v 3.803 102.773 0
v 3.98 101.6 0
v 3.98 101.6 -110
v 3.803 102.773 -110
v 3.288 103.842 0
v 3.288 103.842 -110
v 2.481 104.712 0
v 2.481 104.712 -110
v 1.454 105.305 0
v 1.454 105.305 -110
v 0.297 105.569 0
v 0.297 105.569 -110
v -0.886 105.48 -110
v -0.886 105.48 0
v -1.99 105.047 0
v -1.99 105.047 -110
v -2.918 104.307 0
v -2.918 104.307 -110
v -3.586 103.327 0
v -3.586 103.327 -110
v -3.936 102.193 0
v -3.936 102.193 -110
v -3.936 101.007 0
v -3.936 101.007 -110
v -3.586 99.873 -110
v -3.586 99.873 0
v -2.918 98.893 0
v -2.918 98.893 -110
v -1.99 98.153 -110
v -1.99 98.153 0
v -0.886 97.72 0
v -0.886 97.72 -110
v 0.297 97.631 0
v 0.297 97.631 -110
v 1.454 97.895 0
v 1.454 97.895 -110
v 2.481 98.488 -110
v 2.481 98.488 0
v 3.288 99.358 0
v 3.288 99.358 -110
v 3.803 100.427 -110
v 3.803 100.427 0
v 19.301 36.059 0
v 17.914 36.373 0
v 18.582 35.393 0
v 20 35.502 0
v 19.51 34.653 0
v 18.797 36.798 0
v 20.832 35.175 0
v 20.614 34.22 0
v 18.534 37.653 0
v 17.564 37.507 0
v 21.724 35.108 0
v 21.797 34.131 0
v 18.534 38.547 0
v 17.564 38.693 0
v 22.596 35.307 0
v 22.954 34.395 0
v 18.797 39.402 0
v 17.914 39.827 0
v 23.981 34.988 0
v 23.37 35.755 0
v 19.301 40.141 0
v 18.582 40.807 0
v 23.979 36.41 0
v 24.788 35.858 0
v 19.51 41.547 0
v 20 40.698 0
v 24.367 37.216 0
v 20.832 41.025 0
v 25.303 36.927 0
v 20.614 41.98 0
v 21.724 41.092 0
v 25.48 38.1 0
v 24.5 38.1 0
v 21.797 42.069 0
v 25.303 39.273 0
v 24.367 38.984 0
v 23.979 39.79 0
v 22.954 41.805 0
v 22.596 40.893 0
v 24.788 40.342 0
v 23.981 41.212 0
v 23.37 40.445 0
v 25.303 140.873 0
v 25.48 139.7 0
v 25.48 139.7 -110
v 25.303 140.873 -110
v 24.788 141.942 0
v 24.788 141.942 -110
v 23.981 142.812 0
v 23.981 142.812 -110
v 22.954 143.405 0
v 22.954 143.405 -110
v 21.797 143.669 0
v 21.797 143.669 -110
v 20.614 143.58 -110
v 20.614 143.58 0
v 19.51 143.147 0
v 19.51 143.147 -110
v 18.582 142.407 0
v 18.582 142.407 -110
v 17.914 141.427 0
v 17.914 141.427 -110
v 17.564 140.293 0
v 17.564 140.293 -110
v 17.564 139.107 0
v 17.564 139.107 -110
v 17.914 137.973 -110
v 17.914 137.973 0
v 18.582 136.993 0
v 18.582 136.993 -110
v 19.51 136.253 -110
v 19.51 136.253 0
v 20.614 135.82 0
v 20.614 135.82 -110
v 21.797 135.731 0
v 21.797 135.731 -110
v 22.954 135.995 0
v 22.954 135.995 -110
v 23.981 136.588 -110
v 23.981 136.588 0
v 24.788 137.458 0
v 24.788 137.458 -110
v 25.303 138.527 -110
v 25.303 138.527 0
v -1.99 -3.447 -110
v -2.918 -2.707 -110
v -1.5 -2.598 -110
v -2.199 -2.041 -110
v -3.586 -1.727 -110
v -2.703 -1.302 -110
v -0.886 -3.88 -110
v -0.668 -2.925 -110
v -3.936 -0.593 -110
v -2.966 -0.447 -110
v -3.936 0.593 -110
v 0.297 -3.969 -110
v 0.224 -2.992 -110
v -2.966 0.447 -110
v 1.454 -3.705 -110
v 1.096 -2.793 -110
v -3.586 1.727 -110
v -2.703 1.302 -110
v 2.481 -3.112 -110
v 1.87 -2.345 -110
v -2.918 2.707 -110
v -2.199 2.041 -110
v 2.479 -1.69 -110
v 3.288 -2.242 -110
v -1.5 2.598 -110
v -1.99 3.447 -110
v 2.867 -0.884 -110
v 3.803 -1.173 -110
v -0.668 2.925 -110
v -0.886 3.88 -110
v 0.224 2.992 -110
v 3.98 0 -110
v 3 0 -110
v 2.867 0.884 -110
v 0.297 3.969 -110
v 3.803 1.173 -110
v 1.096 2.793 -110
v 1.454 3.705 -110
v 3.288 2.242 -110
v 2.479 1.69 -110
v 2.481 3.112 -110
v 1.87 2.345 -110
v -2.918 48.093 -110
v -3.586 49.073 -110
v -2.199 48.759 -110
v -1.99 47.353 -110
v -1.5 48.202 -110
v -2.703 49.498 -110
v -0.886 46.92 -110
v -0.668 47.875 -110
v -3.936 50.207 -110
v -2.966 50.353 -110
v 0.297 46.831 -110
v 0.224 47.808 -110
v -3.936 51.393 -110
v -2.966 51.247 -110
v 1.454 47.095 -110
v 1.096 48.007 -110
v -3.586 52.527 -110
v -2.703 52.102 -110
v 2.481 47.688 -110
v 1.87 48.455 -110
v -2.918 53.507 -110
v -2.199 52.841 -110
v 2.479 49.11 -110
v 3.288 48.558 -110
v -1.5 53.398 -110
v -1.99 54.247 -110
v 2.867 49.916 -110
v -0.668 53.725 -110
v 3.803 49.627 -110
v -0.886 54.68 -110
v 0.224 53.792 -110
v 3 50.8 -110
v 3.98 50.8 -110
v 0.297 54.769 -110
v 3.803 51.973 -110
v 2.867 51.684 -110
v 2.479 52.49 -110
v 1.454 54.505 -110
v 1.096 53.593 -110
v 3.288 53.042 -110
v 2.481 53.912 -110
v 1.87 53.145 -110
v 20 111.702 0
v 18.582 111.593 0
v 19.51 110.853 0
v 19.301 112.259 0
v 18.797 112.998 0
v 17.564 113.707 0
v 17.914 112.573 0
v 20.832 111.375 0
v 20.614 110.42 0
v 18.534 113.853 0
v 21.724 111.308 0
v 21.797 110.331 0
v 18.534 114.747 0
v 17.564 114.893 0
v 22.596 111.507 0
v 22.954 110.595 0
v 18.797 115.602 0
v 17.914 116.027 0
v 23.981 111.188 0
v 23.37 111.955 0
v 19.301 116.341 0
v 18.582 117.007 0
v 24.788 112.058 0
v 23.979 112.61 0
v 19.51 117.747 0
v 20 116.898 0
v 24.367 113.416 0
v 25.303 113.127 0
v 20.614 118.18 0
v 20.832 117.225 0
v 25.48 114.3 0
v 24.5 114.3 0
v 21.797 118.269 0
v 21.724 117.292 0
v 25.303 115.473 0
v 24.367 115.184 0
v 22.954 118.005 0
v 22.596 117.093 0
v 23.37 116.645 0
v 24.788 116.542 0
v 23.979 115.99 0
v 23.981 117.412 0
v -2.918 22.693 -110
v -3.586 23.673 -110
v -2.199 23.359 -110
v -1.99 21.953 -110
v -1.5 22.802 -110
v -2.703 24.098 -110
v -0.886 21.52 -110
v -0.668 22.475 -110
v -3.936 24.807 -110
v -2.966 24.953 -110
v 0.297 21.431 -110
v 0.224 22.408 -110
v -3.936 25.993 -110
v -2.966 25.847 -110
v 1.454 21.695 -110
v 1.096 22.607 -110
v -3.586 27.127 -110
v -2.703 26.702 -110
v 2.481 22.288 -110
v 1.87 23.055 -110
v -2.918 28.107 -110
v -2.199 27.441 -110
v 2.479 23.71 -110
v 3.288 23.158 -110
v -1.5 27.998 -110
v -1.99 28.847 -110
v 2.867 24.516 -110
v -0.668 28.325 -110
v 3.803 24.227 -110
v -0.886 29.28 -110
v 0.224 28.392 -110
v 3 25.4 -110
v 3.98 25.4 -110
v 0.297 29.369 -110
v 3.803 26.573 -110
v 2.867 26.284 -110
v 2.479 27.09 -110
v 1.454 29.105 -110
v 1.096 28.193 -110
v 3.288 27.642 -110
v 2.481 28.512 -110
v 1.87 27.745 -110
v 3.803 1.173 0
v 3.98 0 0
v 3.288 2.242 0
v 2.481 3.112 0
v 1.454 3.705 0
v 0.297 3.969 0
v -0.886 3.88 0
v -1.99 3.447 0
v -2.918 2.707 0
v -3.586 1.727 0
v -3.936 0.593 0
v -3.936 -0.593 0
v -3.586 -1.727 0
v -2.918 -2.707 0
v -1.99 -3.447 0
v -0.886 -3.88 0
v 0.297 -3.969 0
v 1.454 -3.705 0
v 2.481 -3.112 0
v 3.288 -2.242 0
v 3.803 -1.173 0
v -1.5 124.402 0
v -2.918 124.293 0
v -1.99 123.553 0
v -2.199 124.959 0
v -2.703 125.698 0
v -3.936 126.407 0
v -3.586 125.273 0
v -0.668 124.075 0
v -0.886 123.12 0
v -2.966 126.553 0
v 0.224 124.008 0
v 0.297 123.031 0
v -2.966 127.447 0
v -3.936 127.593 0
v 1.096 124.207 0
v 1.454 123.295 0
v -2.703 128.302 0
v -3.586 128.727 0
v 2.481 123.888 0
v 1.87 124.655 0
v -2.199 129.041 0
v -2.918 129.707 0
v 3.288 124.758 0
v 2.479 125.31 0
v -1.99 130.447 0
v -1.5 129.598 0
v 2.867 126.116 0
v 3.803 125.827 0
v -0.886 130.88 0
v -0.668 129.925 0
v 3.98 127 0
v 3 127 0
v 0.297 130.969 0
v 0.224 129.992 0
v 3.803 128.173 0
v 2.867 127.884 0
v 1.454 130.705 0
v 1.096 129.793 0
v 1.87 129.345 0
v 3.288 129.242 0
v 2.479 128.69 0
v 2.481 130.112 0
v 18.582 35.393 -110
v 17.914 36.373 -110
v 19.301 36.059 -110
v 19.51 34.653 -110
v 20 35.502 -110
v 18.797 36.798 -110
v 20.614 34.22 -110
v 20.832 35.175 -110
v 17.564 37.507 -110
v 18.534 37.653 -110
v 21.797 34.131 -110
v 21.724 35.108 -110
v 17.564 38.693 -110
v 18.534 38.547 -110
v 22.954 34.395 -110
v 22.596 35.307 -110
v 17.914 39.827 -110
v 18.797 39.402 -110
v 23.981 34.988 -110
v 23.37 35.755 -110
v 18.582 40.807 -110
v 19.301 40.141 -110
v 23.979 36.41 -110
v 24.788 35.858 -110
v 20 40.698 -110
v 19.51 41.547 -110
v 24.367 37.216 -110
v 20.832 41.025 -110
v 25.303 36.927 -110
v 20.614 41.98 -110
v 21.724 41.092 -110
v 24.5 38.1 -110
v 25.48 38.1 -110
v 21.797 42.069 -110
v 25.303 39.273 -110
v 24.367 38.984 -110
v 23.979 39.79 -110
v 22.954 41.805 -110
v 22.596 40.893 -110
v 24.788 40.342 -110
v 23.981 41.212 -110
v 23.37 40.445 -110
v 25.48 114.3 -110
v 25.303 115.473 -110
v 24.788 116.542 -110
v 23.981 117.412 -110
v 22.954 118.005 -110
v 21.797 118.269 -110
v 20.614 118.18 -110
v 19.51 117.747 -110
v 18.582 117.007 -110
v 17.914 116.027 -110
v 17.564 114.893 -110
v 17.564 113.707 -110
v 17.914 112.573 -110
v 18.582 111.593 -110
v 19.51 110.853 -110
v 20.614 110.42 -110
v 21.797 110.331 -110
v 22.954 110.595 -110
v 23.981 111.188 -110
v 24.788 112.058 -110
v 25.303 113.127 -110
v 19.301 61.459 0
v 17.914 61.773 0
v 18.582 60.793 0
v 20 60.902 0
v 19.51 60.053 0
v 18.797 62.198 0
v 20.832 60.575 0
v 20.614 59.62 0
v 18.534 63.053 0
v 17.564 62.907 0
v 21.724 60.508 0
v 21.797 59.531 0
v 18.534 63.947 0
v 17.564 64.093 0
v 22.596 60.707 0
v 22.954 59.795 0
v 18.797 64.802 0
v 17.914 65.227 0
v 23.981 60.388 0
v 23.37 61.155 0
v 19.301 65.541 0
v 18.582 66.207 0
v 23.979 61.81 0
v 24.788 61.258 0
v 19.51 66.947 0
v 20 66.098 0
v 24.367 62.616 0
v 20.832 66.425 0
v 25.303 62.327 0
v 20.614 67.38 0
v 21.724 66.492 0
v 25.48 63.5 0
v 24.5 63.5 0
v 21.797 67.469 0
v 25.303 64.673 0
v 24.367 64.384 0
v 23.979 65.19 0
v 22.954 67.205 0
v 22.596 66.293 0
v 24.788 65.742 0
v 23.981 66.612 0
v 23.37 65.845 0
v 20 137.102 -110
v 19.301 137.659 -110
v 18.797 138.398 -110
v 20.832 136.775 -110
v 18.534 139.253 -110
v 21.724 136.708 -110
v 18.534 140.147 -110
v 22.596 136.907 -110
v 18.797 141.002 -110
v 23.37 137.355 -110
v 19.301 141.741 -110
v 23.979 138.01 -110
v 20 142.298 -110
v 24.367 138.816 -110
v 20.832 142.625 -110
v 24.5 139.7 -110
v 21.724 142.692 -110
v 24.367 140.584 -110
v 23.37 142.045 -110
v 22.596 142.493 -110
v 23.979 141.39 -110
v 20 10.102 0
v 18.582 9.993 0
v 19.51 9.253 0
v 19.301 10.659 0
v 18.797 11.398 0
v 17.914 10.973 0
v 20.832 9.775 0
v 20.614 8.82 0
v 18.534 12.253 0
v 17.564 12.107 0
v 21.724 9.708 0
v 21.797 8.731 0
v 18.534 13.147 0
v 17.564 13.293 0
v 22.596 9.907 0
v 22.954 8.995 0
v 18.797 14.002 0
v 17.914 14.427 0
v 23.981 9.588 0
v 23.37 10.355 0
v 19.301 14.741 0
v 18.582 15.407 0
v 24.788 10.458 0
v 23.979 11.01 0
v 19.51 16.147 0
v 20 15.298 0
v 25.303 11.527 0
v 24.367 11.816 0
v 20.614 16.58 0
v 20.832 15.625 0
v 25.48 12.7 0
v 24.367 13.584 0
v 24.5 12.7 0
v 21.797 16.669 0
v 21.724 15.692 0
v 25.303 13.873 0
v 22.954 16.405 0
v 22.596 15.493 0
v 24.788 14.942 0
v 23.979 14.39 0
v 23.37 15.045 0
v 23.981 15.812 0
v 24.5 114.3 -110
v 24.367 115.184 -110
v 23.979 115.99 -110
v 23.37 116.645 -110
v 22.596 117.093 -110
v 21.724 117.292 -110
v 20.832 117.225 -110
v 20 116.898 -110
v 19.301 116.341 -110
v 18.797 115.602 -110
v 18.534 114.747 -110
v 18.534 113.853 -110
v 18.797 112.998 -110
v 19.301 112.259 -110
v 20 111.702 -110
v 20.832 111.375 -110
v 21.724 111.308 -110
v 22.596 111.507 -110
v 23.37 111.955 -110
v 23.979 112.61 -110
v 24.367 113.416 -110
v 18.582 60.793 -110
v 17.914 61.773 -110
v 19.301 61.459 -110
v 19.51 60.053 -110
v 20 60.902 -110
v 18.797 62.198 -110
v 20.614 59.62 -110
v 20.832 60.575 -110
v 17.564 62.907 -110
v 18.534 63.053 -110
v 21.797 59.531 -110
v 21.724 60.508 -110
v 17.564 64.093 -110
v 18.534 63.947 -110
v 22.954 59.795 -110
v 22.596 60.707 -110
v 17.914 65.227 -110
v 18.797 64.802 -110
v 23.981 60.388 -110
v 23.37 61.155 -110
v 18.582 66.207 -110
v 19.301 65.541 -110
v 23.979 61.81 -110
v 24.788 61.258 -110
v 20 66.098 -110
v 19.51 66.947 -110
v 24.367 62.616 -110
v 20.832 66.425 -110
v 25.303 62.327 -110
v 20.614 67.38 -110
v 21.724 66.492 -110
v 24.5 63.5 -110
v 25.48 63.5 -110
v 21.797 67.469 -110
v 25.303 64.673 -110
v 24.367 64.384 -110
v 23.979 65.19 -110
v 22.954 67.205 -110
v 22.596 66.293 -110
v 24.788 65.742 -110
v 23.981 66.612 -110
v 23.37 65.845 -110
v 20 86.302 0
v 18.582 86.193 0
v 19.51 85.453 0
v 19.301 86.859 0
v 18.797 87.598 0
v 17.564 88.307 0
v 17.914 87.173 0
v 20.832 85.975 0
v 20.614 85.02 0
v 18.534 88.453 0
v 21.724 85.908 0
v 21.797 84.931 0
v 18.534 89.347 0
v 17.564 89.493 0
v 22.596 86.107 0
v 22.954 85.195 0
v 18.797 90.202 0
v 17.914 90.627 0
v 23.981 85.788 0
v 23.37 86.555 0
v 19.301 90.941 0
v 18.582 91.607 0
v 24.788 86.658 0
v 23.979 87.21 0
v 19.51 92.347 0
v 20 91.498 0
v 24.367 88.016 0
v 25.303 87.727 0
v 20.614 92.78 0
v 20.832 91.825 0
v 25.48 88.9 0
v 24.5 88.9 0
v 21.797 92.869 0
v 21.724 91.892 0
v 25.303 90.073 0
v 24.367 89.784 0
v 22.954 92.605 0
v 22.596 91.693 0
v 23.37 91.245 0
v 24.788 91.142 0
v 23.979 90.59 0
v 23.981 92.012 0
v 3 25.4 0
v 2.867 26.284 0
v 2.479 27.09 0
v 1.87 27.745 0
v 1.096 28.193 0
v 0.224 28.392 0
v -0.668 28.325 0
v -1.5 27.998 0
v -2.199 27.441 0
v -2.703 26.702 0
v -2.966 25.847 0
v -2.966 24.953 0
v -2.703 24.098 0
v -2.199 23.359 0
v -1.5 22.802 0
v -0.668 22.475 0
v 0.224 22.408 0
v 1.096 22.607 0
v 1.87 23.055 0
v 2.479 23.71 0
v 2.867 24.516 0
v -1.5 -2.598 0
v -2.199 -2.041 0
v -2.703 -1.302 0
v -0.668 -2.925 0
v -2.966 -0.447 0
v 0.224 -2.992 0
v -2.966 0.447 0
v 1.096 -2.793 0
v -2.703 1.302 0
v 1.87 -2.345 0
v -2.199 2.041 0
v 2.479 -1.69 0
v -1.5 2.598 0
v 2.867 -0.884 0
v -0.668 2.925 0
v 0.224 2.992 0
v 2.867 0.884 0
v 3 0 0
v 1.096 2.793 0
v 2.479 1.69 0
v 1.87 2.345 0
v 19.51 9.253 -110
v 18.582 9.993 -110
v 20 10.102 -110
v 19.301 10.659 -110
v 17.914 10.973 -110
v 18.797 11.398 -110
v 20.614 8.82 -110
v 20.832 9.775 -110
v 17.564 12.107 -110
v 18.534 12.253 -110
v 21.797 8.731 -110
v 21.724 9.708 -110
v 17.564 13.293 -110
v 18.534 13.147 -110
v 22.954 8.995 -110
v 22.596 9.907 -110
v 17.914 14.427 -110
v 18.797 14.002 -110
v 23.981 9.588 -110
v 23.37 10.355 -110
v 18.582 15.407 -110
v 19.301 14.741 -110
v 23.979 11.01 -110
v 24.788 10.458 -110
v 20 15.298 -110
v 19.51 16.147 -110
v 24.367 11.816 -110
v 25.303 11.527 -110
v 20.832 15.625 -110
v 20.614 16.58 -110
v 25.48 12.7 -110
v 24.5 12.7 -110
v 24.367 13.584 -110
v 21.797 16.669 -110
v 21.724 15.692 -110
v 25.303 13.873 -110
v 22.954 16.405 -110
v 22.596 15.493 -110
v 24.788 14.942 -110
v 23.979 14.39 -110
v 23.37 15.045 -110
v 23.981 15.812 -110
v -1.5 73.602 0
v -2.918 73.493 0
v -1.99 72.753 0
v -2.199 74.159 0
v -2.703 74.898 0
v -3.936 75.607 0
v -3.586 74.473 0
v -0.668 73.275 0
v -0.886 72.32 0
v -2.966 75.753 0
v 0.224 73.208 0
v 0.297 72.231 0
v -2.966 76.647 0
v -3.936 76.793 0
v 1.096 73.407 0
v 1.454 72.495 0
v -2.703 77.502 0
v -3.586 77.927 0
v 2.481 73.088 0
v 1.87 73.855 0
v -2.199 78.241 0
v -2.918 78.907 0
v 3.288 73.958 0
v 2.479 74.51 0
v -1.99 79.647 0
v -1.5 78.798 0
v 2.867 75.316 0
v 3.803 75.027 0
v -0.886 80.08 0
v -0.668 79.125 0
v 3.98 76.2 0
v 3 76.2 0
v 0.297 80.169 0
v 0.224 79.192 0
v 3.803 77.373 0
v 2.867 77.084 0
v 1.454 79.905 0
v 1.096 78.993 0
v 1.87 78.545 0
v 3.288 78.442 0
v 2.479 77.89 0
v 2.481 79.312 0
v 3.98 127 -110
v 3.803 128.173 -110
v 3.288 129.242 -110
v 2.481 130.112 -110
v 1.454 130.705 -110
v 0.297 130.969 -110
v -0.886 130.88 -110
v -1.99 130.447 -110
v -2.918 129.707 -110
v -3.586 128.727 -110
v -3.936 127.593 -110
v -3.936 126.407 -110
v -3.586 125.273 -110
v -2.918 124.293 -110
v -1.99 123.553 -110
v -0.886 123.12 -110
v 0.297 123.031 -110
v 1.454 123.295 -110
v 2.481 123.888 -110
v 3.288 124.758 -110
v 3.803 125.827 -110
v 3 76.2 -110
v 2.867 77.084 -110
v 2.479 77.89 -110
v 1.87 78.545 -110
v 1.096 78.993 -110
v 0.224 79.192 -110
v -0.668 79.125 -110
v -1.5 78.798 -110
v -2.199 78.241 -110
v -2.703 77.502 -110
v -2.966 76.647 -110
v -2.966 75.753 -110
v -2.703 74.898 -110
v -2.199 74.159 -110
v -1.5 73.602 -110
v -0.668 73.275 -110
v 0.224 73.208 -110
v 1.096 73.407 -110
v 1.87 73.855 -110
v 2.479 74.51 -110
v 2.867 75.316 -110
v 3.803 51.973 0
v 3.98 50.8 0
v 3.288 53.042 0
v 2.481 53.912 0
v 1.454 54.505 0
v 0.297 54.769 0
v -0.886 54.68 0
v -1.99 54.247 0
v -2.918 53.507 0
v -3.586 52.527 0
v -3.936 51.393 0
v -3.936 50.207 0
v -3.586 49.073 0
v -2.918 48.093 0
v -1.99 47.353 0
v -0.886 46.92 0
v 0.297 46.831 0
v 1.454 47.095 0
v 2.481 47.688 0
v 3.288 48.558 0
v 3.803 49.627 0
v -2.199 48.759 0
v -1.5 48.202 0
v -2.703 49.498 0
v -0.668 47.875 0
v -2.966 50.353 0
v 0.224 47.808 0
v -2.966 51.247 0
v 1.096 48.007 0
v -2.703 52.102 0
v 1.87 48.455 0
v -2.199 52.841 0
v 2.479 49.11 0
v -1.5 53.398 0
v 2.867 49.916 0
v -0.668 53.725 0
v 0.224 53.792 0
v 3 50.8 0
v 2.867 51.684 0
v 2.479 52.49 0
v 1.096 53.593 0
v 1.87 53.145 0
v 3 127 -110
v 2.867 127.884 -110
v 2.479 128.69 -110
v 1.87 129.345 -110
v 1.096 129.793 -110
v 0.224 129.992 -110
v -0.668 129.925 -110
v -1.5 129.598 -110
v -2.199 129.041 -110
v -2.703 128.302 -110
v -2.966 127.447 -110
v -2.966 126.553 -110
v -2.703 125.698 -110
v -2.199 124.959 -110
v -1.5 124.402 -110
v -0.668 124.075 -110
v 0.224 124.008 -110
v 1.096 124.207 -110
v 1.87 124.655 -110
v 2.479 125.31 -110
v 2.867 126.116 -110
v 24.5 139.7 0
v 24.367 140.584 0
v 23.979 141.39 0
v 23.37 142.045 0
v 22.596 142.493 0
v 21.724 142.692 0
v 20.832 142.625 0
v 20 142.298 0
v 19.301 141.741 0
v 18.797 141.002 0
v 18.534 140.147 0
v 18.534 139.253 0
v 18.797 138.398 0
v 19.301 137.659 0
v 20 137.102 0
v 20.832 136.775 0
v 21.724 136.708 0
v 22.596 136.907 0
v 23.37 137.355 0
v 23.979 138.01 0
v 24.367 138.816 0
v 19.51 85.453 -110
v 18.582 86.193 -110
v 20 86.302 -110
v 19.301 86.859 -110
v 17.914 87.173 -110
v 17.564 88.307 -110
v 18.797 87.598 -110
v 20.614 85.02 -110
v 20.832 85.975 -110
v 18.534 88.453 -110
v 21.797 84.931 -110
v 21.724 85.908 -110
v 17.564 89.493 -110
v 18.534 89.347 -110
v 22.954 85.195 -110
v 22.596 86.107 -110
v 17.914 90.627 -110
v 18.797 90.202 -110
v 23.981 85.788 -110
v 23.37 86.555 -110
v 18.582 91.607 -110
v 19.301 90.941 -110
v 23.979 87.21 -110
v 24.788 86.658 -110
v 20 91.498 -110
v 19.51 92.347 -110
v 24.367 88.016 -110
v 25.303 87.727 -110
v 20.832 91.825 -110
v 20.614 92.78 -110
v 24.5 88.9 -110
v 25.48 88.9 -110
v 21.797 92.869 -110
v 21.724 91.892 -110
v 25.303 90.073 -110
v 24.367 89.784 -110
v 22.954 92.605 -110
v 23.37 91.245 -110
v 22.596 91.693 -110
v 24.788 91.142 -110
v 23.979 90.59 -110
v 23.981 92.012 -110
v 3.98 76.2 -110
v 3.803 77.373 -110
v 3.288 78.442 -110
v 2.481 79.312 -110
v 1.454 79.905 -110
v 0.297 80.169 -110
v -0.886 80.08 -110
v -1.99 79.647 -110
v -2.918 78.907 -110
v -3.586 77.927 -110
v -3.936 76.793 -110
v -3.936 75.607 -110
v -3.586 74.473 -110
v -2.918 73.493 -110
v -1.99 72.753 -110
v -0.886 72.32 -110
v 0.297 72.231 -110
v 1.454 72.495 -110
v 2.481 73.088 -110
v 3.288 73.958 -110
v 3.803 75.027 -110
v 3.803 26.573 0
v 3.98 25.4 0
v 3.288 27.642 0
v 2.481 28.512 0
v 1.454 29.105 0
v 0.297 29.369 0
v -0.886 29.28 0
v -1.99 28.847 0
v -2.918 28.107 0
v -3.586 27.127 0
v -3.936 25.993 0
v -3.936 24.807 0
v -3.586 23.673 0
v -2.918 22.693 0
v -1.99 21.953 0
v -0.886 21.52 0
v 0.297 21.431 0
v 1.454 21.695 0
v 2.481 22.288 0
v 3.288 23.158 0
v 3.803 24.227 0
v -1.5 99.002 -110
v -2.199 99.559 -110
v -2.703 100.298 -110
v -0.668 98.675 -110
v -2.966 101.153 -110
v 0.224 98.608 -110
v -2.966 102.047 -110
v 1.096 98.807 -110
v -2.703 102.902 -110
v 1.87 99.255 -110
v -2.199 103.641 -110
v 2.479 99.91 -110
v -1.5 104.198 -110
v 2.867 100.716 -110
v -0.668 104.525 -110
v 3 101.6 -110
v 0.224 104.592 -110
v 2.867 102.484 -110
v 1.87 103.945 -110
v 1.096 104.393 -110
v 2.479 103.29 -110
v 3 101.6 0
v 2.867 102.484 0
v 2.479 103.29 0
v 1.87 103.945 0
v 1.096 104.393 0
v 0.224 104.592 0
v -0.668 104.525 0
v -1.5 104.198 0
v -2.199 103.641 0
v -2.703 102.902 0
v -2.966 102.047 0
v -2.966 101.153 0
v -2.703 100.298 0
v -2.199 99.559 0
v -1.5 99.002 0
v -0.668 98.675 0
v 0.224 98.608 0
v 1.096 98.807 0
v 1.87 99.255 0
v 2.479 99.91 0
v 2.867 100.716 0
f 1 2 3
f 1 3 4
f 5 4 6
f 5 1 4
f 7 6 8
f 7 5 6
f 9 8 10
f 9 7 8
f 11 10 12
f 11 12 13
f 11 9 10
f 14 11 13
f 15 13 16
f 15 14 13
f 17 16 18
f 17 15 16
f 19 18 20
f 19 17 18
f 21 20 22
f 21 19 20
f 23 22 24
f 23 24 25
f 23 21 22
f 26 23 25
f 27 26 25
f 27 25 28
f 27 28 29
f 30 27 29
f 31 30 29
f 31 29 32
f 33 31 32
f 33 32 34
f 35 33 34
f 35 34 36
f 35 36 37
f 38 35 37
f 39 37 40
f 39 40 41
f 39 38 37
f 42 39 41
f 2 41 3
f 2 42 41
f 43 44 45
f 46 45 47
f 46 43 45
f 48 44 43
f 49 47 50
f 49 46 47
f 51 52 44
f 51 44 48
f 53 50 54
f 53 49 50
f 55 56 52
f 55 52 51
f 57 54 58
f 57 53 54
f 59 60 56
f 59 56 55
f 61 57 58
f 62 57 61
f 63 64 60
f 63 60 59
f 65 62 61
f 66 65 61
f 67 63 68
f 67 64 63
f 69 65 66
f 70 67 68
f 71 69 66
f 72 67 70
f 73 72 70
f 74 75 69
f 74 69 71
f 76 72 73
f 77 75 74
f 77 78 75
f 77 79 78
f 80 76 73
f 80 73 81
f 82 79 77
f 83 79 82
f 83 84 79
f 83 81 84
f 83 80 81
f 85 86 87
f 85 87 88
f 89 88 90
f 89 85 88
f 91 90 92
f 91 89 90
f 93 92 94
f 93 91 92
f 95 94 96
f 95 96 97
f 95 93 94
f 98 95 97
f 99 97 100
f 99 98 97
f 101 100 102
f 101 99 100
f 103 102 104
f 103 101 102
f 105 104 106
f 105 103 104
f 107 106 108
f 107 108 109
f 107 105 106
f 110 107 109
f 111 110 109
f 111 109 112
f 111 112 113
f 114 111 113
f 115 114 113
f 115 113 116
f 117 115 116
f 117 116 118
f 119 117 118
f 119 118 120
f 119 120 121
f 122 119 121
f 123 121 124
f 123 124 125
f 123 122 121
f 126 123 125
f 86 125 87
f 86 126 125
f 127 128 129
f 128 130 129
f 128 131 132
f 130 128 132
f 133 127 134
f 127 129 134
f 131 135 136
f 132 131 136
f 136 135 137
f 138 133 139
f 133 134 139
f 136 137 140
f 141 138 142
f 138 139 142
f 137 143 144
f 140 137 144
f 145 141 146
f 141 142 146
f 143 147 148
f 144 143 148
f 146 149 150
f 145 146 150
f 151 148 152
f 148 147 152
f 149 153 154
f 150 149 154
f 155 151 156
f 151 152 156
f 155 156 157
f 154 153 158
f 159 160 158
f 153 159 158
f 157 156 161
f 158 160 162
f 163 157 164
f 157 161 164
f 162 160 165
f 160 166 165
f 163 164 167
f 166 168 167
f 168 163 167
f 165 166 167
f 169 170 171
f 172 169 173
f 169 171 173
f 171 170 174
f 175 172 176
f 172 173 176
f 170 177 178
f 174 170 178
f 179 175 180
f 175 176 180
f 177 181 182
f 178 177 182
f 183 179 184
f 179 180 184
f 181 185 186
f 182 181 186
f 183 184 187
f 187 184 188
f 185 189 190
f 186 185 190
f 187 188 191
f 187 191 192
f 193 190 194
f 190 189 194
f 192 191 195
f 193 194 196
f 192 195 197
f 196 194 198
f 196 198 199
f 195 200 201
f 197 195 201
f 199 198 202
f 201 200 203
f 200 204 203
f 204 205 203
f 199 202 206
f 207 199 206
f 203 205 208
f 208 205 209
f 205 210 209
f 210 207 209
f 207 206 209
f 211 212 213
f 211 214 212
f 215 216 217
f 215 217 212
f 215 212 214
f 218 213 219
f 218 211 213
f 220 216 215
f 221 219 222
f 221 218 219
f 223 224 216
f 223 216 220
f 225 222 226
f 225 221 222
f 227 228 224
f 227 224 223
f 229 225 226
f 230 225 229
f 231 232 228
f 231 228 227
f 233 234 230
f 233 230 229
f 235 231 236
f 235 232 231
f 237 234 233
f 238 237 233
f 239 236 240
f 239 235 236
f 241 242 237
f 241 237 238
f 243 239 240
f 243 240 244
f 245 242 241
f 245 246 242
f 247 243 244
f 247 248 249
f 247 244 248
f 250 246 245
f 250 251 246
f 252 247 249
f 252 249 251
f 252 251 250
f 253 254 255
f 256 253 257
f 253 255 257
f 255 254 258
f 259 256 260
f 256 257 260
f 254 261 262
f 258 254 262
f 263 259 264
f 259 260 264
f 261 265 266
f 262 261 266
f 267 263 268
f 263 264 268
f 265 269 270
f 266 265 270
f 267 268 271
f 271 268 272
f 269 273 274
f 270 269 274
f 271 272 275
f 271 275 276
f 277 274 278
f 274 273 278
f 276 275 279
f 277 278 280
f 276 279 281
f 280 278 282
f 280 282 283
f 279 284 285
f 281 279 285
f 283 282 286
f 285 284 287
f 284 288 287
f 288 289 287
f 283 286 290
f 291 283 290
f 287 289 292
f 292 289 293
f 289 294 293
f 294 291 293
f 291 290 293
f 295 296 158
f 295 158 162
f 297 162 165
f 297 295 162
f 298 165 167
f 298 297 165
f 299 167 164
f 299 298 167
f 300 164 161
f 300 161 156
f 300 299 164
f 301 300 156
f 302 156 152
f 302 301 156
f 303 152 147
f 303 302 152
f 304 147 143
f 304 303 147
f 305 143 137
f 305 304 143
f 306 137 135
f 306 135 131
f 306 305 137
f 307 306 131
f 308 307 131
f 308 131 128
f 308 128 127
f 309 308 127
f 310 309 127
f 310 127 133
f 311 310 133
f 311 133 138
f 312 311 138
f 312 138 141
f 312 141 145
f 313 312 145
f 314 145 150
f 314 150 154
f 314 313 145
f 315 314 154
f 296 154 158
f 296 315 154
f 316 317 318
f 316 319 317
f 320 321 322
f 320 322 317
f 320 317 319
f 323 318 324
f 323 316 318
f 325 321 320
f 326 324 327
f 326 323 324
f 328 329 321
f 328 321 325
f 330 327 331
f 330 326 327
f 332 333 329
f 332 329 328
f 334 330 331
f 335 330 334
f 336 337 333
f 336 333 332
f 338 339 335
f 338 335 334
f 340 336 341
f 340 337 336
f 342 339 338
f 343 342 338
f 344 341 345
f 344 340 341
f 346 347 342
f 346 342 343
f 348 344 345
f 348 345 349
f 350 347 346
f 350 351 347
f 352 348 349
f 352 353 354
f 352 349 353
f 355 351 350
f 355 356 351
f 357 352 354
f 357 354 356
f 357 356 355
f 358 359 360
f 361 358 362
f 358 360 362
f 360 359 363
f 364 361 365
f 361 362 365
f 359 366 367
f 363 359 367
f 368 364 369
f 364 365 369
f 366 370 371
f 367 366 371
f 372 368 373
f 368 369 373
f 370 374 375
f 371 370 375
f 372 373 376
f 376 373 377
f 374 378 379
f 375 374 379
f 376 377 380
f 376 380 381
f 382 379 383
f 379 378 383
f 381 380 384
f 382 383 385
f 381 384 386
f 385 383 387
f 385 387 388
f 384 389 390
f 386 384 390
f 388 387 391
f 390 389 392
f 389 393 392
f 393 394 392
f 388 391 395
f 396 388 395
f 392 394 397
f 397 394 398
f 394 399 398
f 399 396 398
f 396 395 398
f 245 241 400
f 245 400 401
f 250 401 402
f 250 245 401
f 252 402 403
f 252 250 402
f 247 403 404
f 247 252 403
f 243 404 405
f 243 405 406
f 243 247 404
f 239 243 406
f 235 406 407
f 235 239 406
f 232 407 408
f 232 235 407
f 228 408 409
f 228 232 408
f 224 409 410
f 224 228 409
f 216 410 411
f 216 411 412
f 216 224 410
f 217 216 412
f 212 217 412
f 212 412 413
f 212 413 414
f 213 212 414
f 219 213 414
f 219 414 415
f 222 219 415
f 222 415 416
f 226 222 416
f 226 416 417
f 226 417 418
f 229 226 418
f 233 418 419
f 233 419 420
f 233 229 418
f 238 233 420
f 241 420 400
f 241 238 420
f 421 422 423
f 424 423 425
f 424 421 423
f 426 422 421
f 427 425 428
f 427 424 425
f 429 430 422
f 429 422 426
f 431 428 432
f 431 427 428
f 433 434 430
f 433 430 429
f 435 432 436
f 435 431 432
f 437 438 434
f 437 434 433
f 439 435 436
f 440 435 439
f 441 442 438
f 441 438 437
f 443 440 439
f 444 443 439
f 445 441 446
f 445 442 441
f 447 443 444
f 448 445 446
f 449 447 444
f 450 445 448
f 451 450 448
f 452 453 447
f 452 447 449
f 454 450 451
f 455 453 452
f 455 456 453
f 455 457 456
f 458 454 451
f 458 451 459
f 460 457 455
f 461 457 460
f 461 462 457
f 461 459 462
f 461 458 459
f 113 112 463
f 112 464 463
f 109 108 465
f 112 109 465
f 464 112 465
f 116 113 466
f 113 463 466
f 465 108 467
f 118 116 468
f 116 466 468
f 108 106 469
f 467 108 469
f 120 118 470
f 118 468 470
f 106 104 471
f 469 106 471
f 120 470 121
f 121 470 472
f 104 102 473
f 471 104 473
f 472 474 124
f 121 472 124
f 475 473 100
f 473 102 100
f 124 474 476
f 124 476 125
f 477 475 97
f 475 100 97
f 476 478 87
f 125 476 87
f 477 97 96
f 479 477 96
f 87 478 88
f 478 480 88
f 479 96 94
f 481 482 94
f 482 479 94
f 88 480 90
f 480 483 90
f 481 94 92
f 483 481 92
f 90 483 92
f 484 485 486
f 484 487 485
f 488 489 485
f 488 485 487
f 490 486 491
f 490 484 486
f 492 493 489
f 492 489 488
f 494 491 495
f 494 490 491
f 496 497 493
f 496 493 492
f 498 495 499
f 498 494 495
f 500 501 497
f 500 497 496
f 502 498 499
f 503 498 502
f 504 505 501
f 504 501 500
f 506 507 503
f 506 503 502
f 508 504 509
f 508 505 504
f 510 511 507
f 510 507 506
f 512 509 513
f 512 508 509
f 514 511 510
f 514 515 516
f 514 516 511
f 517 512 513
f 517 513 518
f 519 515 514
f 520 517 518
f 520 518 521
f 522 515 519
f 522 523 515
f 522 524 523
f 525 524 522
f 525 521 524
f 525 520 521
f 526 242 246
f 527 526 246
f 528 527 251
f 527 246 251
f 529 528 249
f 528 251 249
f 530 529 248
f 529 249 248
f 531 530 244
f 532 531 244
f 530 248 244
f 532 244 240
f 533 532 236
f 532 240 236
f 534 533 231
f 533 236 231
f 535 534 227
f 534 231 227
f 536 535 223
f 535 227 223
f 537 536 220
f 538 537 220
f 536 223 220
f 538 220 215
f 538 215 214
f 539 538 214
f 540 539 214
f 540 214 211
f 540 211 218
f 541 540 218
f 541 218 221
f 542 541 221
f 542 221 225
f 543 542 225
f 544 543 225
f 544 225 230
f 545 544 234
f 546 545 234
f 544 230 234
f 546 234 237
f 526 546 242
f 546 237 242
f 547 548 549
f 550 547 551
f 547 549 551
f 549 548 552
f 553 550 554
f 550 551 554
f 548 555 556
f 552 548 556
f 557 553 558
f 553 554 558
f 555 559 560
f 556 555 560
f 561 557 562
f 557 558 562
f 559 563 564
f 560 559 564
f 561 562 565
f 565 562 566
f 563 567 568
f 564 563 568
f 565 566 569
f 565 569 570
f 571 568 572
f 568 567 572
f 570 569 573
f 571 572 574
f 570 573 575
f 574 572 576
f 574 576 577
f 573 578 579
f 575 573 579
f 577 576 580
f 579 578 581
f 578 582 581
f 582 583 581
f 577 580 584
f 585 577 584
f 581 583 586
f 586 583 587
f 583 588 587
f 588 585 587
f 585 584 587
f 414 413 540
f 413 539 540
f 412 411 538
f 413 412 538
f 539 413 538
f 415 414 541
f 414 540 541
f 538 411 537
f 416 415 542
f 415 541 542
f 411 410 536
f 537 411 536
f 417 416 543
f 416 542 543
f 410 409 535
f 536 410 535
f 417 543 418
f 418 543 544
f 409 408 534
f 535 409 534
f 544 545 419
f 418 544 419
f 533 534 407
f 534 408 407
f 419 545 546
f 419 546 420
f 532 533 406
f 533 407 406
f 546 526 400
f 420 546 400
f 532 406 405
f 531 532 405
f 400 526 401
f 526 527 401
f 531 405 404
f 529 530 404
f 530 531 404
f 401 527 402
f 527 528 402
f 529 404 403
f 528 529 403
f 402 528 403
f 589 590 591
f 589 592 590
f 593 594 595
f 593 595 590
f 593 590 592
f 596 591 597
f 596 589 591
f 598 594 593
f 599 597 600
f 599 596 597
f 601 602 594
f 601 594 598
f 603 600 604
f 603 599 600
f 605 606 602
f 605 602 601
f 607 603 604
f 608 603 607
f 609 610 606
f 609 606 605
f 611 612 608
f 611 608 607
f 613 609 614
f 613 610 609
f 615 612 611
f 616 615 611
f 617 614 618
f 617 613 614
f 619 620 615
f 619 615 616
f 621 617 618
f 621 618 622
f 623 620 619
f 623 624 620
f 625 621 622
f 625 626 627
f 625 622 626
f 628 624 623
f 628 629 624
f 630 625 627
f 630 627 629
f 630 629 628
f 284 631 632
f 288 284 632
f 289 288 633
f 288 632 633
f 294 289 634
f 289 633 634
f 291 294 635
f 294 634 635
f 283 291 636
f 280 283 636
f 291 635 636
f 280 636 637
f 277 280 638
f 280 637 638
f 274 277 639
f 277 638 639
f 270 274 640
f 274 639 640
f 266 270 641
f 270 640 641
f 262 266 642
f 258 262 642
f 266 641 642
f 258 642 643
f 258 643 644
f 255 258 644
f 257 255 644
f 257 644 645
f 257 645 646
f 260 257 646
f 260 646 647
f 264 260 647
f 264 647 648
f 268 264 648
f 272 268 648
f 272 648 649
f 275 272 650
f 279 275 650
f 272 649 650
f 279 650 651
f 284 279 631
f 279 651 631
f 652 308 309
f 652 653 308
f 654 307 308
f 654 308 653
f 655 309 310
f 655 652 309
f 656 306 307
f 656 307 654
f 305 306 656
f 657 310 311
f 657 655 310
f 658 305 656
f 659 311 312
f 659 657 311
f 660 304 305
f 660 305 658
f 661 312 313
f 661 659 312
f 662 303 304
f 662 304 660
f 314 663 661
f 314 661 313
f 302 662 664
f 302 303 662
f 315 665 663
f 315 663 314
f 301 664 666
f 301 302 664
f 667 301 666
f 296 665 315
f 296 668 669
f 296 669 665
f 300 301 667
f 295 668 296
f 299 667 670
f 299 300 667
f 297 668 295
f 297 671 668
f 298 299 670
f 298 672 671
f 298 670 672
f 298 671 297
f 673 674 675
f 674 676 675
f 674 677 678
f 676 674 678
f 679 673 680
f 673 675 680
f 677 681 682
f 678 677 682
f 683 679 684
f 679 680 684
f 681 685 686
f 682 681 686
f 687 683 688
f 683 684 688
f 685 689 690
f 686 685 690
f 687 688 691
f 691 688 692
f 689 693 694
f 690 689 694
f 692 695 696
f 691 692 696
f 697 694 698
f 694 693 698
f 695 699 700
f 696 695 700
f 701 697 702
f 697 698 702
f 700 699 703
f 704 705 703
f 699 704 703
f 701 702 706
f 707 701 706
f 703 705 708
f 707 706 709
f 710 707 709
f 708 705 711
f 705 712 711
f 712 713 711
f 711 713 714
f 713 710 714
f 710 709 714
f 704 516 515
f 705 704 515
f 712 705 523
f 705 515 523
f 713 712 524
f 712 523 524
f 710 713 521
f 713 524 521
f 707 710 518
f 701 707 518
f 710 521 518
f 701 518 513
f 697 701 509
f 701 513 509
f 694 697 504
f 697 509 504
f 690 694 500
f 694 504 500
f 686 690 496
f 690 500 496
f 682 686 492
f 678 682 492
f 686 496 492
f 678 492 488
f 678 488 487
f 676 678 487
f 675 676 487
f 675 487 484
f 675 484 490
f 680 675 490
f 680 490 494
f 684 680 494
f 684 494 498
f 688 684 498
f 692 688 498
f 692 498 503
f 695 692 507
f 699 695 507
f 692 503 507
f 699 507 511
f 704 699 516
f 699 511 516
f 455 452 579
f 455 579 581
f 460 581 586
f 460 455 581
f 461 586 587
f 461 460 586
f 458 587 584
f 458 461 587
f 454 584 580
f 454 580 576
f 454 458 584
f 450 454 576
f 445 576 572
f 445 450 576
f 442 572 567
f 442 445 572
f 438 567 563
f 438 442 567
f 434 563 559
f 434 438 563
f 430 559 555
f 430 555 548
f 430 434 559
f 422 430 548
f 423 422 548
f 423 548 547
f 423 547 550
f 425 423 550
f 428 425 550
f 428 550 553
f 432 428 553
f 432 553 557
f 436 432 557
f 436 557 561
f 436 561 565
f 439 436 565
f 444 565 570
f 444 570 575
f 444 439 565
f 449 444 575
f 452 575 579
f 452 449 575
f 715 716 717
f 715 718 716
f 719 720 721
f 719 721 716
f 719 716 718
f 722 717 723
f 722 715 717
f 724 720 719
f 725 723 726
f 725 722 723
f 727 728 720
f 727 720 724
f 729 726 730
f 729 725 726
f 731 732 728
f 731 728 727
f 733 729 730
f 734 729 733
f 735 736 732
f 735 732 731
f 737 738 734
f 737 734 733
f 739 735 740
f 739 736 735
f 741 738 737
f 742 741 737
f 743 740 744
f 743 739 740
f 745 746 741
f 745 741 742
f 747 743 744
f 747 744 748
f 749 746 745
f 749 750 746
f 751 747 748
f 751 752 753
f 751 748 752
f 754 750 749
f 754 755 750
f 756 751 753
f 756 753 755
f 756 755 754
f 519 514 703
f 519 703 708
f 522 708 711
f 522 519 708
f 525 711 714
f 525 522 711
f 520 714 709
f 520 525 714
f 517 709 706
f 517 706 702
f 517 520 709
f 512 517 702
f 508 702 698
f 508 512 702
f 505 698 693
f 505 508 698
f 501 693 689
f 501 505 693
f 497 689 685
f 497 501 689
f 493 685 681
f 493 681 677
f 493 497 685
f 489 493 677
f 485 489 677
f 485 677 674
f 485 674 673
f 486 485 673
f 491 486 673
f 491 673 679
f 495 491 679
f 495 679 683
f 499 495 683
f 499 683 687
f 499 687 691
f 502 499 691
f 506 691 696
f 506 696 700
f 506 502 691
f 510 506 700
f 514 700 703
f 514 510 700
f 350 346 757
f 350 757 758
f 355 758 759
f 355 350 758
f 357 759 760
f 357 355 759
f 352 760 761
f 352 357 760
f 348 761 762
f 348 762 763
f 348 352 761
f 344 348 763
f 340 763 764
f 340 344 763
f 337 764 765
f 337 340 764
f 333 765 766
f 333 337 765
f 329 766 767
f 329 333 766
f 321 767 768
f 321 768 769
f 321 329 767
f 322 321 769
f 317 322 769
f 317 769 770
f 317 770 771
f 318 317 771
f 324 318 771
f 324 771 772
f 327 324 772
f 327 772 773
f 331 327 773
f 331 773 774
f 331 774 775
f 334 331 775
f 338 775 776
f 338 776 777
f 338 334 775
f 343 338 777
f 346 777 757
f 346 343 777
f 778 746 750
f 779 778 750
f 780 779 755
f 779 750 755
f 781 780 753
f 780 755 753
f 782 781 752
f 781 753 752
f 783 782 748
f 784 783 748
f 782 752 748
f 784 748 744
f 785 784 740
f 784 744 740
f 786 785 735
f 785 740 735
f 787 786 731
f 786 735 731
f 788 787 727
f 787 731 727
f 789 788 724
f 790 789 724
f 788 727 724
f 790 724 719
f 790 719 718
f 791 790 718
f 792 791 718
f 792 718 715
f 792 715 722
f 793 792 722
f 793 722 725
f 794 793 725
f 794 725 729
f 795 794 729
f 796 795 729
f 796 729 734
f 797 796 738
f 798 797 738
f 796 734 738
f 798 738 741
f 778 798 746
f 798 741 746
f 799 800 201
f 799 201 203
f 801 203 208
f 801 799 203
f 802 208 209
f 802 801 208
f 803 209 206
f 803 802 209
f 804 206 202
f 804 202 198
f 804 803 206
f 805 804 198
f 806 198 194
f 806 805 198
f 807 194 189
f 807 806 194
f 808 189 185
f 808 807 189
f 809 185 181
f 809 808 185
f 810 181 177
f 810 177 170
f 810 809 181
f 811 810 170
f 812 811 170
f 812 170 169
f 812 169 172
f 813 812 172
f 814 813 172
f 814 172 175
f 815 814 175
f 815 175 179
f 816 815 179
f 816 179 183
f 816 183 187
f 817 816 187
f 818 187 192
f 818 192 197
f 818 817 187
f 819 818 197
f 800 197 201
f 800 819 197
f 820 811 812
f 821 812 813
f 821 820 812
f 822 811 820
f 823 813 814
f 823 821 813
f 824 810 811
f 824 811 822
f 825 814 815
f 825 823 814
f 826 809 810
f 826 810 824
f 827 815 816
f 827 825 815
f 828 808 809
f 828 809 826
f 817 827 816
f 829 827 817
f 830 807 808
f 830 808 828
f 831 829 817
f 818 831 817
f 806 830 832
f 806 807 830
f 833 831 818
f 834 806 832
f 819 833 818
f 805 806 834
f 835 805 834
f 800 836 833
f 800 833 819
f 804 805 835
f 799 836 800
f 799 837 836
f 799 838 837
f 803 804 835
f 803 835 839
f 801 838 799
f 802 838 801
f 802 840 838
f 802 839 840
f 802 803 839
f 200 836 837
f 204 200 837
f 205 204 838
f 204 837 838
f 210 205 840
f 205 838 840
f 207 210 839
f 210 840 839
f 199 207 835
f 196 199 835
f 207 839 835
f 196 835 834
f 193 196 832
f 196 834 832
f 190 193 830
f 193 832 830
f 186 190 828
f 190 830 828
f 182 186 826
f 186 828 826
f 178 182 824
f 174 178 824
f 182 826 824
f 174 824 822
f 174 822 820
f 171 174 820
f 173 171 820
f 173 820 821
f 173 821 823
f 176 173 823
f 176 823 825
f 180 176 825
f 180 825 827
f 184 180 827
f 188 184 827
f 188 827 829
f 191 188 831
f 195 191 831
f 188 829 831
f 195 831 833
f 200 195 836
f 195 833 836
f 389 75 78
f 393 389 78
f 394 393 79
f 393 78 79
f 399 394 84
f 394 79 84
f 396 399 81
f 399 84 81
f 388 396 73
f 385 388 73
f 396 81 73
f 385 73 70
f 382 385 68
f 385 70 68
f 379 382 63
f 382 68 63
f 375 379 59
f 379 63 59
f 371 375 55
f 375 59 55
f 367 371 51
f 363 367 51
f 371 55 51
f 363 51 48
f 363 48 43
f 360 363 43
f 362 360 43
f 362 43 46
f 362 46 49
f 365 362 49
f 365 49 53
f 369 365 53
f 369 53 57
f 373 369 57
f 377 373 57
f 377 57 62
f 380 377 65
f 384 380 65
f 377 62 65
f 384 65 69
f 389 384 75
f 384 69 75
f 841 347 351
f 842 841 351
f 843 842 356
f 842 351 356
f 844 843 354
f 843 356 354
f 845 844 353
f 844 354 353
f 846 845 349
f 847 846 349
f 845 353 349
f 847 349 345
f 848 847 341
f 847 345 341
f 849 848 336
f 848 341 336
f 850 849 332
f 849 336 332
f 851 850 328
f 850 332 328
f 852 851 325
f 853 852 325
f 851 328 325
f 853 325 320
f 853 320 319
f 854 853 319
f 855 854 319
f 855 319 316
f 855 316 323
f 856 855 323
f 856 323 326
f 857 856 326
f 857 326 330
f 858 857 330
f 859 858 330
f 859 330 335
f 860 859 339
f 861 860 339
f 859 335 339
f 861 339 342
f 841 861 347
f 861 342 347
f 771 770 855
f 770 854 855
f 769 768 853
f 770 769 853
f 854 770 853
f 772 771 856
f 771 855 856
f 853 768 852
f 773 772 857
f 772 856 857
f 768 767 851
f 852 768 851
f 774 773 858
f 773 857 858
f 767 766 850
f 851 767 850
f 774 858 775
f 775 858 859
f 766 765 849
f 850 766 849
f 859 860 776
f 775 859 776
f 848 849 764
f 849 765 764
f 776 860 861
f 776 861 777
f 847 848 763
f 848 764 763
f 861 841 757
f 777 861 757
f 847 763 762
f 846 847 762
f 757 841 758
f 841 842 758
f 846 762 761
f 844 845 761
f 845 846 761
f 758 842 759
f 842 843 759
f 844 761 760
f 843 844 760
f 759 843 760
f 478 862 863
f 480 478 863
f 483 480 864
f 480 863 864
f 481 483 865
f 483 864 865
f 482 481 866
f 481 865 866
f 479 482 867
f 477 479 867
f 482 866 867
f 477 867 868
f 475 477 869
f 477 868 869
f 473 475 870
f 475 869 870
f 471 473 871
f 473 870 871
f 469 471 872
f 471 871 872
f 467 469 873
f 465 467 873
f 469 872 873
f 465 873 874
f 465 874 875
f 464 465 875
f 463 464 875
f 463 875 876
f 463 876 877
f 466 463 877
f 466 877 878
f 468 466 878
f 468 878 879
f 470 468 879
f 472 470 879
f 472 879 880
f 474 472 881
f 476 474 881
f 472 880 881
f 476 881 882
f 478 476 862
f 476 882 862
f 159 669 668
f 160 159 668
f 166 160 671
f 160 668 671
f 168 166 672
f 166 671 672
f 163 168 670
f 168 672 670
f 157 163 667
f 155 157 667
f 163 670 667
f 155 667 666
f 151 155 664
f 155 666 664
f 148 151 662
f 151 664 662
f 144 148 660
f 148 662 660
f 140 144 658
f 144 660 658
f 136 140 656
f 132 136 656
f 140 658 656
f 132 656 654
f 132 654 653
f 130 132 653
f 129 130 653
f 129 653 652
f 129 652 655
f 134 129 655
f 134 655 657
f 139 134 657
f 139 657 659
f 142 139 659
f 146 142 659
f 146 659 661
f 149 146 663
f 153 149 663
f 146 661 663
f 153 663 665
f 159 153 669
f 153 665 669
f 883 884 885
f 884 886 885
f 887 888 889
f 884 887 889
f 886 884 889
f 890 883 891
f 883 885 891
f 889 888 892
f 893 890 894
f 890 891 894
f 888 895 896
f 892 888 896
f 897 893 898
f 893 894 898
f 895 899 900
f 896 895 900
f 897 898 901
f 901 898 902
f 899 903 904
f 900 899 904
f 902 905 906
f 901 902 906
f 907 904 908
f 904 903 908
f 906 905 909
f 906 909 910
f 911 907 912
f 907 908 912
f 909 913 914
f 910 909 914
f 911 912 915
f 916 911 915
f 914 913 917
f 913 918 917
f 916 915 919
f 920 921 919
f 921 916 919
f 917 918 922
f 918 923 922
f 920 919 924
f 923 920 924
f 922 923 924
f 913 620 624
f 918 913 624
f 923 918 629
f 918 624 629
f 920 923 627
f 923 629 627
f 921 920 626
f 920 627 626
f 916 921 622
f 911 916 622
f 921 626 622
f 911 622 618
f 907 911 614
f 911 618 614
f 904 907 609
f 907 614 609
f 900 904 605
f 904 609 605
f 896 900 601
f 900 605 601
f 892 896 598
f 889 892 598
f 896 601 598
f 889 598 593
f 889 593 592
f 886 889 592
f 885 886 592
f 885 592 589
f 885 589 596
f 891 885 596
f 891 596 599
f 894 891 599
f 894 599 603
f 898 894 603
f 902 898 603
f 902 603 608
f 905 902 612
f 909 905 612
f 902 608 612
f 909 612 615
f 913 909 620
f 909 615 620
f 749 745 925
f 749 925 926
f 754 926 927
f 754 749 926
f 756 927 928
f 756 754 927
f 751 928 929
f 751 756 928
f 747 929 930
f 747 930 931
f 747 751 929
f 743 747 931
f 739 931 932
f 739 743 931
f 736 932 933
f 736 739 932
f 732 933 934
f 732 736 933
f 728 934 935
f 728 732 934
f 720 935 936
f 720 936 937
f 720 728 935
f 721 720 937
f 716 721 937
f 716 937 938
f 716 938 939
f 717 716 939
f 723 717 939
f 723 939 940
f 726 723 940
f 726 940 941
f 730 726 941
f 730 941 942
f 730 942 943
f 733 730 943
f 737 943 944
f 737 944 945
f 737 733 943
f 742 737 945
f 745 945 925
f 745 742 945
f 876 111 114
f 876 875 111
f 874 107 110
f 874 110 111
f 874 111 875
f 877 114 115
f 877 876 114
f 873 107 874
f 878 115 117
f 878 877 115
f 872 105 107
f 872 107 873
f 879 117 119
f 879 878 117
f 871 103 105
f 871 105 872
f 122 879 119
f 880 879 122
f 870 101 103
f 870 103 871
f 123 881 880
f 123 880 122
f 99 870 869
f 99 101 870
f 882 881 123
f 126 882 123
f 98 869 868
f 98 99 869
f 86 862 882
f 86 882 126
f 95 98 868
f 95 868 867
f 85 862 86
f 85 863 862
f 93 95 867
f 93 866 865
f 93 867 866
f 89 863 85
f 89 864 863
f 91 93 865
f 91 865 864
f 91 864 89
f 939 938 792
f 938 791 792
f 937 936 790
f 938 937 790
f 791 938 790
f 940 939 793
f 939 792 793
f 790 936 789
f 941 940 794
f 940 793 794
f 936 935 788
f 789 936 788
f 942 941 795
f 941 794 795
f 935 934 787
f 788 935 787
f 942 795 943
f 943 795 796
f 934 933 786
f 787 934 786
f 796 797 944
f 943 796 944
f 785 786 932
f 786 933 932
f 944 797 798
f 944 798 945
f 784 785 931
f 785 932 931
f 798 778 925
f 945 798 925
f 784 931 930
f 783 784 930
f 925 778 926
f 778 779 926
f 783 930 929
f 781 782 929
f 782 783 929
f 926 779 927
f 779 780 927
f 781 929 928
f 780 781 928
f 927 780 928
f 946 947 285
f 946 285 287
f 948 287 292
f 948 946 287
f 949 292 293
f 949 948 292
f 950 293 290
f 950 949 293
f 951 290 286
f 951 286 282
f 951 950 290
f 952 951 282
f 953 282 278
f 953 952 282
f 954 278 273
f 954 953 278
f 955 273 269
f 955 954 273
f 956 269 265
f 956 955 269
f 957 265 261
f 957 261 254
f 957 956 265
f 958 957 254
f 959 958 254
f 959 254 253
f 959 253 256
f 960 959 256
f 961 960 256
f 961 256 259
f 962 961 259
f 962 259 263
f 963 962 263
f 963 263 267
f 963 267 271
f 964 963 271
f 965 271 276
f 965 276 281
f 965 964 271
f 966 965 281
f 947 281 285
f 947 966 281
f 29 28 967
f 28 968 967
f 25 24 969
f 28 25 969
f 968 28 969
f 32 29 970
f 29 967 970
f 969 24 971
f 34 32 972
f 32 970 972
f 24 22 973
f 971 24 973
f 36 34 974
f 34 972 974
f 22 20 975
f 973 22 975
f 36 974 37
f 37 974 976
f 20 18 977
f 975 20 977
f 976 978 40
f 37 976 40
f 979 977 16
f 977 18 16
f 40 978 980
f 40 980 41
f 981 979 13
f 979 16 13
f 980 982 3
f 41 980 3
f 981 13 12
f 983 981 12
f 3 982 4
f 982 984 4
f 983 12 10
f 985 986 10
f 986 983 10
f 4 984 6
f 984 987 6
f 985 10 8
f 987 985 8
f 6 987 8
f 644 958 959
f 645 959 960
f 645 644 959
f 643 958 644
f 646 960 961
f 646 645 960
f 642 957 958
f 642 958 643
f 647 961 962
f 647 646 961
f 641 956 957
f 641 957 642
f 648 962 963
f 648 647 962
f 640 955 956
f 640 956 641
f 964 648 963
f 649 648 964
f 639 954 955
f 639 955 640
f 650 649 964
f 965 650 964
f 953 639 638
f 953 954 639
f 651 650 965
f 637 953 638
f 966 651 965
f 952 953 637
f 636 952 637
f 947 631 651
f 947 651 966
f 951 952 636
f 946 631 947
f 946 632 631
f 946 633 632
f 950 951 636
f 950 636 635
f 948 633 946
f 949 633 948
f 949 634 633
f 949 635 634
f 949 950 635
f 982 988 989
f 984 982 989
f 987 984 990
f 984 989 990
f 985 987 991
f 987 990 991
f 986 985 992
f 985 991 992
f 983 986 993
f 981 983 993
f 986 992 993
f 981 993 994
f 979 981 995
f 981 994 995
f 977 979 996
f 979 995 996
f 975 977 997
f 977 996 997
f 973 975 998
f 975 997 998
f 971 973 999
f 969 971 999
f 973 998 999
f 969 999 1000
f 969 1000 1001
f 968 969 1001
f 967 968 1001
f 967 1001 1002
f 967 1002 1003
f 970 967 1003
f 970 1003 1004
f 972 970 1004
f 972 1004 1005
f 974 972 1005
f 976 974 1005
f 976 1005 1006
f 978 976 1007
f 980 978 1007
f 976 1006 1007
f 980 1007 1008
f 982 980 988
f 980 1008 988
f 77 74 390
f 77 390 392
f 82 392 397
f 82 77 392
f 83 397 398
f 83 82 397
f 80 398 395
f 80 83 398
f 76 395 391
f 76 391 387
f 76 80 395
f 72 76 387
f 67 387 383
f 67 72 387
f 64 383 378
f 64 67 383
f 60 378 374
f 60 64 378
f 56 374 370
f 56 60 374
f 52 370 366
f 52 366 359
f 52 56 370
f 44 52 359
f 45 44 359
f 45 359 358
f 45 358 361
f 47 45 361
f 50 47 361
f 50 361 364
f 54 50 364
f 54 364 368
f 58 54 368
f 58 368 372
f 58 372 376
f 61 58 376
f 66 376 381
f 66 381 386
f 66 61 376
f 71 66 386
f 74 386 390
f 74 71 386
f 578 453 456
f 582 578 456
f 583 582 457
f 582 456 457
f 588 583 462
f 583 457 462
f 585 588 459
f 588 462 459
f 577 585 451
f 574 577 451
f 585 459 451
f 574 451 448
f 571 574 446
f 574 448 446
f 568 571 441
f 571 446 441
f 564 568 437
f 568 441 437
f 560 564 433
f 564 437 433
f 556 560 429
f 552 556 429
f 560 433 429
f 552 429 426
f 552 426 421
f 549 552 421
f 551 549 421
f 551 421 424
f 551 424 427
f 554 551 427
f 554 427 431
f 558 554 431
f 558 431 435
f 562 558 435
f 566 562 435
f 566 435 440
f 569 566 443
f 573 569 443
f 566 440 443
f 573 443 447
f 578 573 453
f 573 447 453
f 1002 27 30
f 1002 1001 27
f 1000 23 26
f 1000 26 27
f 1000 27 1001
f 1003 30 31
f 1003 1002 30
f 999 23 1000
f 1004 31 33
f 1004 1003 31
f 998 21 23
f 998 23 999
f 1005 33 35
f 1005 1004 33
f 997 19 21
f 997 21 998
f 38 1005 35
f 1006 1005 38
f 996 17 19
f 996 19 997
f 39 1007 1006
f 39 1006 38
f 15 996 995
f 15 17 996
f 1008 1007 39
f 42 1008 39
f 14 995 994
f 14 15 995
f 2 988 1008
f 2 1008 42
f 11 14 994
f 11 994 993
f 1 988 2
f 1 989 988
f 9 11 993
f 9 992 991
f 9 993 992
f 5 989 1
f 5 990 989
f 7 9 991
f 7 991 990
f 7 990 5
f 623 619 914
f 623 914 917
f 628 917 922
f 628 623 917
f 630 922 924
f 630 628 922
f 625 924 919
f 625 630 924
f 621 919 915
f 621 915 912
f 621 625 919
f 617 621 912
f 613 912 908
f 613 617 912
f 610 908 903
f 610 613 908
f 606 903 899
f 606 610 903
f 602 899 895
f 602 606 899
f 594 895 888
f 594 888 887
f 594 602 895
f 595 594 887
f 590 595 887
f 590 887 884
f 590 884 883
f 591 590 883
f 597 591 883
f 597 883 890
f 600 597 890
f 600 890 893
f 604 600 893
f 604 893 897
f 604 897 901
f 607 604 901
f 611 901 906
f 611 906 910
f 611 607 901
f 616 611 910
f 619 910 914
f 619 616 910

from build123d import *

# Parameters (mm, degrees)
ESBO_O1_R                   = 3.98
ESBO_O1_R_2                 = 3
RESSALTO_EXTRUS_O1_DEPTH    = 110
RESSALTO_EXTRUS_O1_2_DEPTH  = 110
RESSALTO_EXTRUS_O1_3_DEPTH  = 110
RESSALTO_EXTRUS_O1_4_DEPTH  = 110
RESSALTO_EXTRUS_O1_5_DEPTH  = 110
RESSALTO_EXTRUS_O1_6_DEPTH  = 110
RESSALTO_EXTRUS_O1_7_DEPTH  = 110
RESSALTO_EXTRUS_O1_8_DEPTH  = 110
RESSALTO_EXTRUS_O1_9_DEPTH  = 110
RESSALTO_EXTRUS_O1_10_DEPTH = 110
RESSALTO_EXTRUS_O1_11_DEPTH = 110
RESSALTO_EXTRUS_O1_12_DEPTH = 110


with BuildPart() as part:
    # Esboço1 → Ressalto-extrusão1 (new body)
    with BuildSketch(Plane.XY):
        Circle(ESBO_O1_R)
        Circle(ESBO_O1_R_2, mode=Mode.SUBTRACT)
    extrude(amount=-RESSALTO_EXTRUS_O1_DEPTH)


with BuildPart() as body_2:
    # Esboço1 → Ressalto-extrus_o1 2 (new body)
    with BuildSketch(Plane.XY):
        with Locations((21.5, 12.7)):
            Circle(ESBO_O1_R)
        with Locations((21.5, 12.7)):
            Circle(ESBO_O1_R_2, mode=Mode.SUBTRACT)
    extrude(amount=-RESSALTO_EXTRUS_O1_2_DEPTH)


with BuildPart() as body_3:
    # Esboço1 → Ressalto-extrus_o1 3 (new body)
    with BuildSketch(Plane.XY):
        with Locations((0, 25.4)):
            Circle(ESBO_O1_R)
        with Locations((0, 25.4)):
            Circle(ESBO_O1_R_2, mode=Mode.SUBTRACT)
    extrude(amount=-RESSALTO_EXTRUS_O1_3_DEPTH)


with BuildPart() as body_4:
    # Esboço1 → Ressalto-extrus_o1 4 (new body)
    with BuildSketch(Plane.XY):
        with Locations((0, 50.8)):
            Circle(ESBO_O1_R)
        with Locations((0, 50.8)):
            Circle(ESBO_O1_R_2, mode=Mode.SUBTRACT)
    extrude(amount=-RESSALTO_EXTRUS_O1_4_DEPTH)


with BuildPart() as body_5:
    # Esboço1 → Ressalto-extrus_o1 5 (new body)
    with BuildSketch(Plane.XY):
        with Locations((0, 76.2)):
            Circle(ESBO_O1_R)
        with Locations((0, 76.2)):
            Circle(ESBO_O1_R_2, mode=Mode.SUBTRACT)
    extrude(amount=-RESSALTO_EXTRUS_O1_5_DEPTH)


with BuildPart() as body_6:
    # Esboço1 → Ressalto-extrus_o1 6 (new body)
    with BuildSketch(Plane.XY):
        with Locations((0, 101.6)):
            Circle(ESBO_O1_R)
        with Locations((0, 101.6)):
            Circle(ESBO_O1_R_2, mode=Mode.SUBTRACT)
    extrude(amount=-RESSALTO_EXTRUS_O1_6_DEPTH)


with BuildPart() as body_7:
    # Esboço1 → Ressalto-extrus_o1 7 (new body)
    with BuildSketch(Plane.XY):
        with Locations((0, 127)):
            Circle(ESBO_O1_R)
        with Locations((0, 127)):
            Circle(ESBO_O1_R_2, mode=Mode.SUBTRACT)
    extrude(amount=-RESSALTO_EXTRUS_O1_7_DEPTH)


with BuildPart() as body_8:
    # Esboço1 → Ressalto-extrus_o1 8 (new body)
    with BuildSketch(Plane.XY):
        with Locations((21.5, 38.1)):
            Circle(ESBO_O1_R)
        with Locations((21.5, 38.1)):
            Circle(ESBO_O1_R_2, mode=Mode.SUBTRACT)
    extrude(amount=-RESSALTO_EXTRUS_O1_8_DEPTH)


with BuildPart() as body_9:
    # Esboço1 → Ressalto-extrus_o1 9 (new body)
    with BuildSketch(Plane.XY):
        with Locations((21.5, 63.5)):
            Circle(ESBO_O1_R)
        with Locations((21.5, 63.5)):
            Circle(ESBO_O1_R_2, mode=Mode.SUBTRACT)
    extrude(amount=-RESSALTO_EXTRUS_O1_9_DEPTH)


with BuildPart() as body_10:
    # Esboço1 → Ressalto-extrus_o1 10 (new body)
    with BuildSketch(Plane.XY):
        with Locations((21.5, 88.9)):
            Circle(ESBO_O1_R)
        with Locations((21.5, 88.9)):
            Circle(ESBO_O1_R_2, mode=Mode.SUBTRACT)
    extrude(amount=-RESSALTO_EXTRUS_O1_10_DEPTH)


with BuildPart() as body_11:
    # Esboço1 → Ressalto-extrus_o1 11 (new body)
    with BuildSketch(Plane.XY):
        with Locations((21.5, 114.3)):
            Circle(ESBO_O1_R)
        with Locations((21.5, 114.3)):
            Circle(ESBO_O1_R_2, mode=Mode.SUBTRACT)
    extrude(amount=-RESSALTO_EXTRUS_O1_11_DEPTH)


with BuildPart() as body_12:
    # Esboço1 → Ressalto-extrus_o1 12 (new body)
    with BuildSketch(Plane.XY):
        with Locations((21.5, 139.7)):
            Circle(ESBO_O1_R)
        with Locations((21.5, 139.7)):
            Circle(ESBO_O1_R_2, mode=Mode.SUBTRACT)
    extrude(amount=-RESSALTO_EXTRUS_O1_12_DEPTH)


solid = Compound([part.part, body_2.part, body_3.part, body_4.part, body_5.part, body_6.part, body_7.part, body_8.part, body_9.part, body_10.part, body_11.part, body_12.part])
